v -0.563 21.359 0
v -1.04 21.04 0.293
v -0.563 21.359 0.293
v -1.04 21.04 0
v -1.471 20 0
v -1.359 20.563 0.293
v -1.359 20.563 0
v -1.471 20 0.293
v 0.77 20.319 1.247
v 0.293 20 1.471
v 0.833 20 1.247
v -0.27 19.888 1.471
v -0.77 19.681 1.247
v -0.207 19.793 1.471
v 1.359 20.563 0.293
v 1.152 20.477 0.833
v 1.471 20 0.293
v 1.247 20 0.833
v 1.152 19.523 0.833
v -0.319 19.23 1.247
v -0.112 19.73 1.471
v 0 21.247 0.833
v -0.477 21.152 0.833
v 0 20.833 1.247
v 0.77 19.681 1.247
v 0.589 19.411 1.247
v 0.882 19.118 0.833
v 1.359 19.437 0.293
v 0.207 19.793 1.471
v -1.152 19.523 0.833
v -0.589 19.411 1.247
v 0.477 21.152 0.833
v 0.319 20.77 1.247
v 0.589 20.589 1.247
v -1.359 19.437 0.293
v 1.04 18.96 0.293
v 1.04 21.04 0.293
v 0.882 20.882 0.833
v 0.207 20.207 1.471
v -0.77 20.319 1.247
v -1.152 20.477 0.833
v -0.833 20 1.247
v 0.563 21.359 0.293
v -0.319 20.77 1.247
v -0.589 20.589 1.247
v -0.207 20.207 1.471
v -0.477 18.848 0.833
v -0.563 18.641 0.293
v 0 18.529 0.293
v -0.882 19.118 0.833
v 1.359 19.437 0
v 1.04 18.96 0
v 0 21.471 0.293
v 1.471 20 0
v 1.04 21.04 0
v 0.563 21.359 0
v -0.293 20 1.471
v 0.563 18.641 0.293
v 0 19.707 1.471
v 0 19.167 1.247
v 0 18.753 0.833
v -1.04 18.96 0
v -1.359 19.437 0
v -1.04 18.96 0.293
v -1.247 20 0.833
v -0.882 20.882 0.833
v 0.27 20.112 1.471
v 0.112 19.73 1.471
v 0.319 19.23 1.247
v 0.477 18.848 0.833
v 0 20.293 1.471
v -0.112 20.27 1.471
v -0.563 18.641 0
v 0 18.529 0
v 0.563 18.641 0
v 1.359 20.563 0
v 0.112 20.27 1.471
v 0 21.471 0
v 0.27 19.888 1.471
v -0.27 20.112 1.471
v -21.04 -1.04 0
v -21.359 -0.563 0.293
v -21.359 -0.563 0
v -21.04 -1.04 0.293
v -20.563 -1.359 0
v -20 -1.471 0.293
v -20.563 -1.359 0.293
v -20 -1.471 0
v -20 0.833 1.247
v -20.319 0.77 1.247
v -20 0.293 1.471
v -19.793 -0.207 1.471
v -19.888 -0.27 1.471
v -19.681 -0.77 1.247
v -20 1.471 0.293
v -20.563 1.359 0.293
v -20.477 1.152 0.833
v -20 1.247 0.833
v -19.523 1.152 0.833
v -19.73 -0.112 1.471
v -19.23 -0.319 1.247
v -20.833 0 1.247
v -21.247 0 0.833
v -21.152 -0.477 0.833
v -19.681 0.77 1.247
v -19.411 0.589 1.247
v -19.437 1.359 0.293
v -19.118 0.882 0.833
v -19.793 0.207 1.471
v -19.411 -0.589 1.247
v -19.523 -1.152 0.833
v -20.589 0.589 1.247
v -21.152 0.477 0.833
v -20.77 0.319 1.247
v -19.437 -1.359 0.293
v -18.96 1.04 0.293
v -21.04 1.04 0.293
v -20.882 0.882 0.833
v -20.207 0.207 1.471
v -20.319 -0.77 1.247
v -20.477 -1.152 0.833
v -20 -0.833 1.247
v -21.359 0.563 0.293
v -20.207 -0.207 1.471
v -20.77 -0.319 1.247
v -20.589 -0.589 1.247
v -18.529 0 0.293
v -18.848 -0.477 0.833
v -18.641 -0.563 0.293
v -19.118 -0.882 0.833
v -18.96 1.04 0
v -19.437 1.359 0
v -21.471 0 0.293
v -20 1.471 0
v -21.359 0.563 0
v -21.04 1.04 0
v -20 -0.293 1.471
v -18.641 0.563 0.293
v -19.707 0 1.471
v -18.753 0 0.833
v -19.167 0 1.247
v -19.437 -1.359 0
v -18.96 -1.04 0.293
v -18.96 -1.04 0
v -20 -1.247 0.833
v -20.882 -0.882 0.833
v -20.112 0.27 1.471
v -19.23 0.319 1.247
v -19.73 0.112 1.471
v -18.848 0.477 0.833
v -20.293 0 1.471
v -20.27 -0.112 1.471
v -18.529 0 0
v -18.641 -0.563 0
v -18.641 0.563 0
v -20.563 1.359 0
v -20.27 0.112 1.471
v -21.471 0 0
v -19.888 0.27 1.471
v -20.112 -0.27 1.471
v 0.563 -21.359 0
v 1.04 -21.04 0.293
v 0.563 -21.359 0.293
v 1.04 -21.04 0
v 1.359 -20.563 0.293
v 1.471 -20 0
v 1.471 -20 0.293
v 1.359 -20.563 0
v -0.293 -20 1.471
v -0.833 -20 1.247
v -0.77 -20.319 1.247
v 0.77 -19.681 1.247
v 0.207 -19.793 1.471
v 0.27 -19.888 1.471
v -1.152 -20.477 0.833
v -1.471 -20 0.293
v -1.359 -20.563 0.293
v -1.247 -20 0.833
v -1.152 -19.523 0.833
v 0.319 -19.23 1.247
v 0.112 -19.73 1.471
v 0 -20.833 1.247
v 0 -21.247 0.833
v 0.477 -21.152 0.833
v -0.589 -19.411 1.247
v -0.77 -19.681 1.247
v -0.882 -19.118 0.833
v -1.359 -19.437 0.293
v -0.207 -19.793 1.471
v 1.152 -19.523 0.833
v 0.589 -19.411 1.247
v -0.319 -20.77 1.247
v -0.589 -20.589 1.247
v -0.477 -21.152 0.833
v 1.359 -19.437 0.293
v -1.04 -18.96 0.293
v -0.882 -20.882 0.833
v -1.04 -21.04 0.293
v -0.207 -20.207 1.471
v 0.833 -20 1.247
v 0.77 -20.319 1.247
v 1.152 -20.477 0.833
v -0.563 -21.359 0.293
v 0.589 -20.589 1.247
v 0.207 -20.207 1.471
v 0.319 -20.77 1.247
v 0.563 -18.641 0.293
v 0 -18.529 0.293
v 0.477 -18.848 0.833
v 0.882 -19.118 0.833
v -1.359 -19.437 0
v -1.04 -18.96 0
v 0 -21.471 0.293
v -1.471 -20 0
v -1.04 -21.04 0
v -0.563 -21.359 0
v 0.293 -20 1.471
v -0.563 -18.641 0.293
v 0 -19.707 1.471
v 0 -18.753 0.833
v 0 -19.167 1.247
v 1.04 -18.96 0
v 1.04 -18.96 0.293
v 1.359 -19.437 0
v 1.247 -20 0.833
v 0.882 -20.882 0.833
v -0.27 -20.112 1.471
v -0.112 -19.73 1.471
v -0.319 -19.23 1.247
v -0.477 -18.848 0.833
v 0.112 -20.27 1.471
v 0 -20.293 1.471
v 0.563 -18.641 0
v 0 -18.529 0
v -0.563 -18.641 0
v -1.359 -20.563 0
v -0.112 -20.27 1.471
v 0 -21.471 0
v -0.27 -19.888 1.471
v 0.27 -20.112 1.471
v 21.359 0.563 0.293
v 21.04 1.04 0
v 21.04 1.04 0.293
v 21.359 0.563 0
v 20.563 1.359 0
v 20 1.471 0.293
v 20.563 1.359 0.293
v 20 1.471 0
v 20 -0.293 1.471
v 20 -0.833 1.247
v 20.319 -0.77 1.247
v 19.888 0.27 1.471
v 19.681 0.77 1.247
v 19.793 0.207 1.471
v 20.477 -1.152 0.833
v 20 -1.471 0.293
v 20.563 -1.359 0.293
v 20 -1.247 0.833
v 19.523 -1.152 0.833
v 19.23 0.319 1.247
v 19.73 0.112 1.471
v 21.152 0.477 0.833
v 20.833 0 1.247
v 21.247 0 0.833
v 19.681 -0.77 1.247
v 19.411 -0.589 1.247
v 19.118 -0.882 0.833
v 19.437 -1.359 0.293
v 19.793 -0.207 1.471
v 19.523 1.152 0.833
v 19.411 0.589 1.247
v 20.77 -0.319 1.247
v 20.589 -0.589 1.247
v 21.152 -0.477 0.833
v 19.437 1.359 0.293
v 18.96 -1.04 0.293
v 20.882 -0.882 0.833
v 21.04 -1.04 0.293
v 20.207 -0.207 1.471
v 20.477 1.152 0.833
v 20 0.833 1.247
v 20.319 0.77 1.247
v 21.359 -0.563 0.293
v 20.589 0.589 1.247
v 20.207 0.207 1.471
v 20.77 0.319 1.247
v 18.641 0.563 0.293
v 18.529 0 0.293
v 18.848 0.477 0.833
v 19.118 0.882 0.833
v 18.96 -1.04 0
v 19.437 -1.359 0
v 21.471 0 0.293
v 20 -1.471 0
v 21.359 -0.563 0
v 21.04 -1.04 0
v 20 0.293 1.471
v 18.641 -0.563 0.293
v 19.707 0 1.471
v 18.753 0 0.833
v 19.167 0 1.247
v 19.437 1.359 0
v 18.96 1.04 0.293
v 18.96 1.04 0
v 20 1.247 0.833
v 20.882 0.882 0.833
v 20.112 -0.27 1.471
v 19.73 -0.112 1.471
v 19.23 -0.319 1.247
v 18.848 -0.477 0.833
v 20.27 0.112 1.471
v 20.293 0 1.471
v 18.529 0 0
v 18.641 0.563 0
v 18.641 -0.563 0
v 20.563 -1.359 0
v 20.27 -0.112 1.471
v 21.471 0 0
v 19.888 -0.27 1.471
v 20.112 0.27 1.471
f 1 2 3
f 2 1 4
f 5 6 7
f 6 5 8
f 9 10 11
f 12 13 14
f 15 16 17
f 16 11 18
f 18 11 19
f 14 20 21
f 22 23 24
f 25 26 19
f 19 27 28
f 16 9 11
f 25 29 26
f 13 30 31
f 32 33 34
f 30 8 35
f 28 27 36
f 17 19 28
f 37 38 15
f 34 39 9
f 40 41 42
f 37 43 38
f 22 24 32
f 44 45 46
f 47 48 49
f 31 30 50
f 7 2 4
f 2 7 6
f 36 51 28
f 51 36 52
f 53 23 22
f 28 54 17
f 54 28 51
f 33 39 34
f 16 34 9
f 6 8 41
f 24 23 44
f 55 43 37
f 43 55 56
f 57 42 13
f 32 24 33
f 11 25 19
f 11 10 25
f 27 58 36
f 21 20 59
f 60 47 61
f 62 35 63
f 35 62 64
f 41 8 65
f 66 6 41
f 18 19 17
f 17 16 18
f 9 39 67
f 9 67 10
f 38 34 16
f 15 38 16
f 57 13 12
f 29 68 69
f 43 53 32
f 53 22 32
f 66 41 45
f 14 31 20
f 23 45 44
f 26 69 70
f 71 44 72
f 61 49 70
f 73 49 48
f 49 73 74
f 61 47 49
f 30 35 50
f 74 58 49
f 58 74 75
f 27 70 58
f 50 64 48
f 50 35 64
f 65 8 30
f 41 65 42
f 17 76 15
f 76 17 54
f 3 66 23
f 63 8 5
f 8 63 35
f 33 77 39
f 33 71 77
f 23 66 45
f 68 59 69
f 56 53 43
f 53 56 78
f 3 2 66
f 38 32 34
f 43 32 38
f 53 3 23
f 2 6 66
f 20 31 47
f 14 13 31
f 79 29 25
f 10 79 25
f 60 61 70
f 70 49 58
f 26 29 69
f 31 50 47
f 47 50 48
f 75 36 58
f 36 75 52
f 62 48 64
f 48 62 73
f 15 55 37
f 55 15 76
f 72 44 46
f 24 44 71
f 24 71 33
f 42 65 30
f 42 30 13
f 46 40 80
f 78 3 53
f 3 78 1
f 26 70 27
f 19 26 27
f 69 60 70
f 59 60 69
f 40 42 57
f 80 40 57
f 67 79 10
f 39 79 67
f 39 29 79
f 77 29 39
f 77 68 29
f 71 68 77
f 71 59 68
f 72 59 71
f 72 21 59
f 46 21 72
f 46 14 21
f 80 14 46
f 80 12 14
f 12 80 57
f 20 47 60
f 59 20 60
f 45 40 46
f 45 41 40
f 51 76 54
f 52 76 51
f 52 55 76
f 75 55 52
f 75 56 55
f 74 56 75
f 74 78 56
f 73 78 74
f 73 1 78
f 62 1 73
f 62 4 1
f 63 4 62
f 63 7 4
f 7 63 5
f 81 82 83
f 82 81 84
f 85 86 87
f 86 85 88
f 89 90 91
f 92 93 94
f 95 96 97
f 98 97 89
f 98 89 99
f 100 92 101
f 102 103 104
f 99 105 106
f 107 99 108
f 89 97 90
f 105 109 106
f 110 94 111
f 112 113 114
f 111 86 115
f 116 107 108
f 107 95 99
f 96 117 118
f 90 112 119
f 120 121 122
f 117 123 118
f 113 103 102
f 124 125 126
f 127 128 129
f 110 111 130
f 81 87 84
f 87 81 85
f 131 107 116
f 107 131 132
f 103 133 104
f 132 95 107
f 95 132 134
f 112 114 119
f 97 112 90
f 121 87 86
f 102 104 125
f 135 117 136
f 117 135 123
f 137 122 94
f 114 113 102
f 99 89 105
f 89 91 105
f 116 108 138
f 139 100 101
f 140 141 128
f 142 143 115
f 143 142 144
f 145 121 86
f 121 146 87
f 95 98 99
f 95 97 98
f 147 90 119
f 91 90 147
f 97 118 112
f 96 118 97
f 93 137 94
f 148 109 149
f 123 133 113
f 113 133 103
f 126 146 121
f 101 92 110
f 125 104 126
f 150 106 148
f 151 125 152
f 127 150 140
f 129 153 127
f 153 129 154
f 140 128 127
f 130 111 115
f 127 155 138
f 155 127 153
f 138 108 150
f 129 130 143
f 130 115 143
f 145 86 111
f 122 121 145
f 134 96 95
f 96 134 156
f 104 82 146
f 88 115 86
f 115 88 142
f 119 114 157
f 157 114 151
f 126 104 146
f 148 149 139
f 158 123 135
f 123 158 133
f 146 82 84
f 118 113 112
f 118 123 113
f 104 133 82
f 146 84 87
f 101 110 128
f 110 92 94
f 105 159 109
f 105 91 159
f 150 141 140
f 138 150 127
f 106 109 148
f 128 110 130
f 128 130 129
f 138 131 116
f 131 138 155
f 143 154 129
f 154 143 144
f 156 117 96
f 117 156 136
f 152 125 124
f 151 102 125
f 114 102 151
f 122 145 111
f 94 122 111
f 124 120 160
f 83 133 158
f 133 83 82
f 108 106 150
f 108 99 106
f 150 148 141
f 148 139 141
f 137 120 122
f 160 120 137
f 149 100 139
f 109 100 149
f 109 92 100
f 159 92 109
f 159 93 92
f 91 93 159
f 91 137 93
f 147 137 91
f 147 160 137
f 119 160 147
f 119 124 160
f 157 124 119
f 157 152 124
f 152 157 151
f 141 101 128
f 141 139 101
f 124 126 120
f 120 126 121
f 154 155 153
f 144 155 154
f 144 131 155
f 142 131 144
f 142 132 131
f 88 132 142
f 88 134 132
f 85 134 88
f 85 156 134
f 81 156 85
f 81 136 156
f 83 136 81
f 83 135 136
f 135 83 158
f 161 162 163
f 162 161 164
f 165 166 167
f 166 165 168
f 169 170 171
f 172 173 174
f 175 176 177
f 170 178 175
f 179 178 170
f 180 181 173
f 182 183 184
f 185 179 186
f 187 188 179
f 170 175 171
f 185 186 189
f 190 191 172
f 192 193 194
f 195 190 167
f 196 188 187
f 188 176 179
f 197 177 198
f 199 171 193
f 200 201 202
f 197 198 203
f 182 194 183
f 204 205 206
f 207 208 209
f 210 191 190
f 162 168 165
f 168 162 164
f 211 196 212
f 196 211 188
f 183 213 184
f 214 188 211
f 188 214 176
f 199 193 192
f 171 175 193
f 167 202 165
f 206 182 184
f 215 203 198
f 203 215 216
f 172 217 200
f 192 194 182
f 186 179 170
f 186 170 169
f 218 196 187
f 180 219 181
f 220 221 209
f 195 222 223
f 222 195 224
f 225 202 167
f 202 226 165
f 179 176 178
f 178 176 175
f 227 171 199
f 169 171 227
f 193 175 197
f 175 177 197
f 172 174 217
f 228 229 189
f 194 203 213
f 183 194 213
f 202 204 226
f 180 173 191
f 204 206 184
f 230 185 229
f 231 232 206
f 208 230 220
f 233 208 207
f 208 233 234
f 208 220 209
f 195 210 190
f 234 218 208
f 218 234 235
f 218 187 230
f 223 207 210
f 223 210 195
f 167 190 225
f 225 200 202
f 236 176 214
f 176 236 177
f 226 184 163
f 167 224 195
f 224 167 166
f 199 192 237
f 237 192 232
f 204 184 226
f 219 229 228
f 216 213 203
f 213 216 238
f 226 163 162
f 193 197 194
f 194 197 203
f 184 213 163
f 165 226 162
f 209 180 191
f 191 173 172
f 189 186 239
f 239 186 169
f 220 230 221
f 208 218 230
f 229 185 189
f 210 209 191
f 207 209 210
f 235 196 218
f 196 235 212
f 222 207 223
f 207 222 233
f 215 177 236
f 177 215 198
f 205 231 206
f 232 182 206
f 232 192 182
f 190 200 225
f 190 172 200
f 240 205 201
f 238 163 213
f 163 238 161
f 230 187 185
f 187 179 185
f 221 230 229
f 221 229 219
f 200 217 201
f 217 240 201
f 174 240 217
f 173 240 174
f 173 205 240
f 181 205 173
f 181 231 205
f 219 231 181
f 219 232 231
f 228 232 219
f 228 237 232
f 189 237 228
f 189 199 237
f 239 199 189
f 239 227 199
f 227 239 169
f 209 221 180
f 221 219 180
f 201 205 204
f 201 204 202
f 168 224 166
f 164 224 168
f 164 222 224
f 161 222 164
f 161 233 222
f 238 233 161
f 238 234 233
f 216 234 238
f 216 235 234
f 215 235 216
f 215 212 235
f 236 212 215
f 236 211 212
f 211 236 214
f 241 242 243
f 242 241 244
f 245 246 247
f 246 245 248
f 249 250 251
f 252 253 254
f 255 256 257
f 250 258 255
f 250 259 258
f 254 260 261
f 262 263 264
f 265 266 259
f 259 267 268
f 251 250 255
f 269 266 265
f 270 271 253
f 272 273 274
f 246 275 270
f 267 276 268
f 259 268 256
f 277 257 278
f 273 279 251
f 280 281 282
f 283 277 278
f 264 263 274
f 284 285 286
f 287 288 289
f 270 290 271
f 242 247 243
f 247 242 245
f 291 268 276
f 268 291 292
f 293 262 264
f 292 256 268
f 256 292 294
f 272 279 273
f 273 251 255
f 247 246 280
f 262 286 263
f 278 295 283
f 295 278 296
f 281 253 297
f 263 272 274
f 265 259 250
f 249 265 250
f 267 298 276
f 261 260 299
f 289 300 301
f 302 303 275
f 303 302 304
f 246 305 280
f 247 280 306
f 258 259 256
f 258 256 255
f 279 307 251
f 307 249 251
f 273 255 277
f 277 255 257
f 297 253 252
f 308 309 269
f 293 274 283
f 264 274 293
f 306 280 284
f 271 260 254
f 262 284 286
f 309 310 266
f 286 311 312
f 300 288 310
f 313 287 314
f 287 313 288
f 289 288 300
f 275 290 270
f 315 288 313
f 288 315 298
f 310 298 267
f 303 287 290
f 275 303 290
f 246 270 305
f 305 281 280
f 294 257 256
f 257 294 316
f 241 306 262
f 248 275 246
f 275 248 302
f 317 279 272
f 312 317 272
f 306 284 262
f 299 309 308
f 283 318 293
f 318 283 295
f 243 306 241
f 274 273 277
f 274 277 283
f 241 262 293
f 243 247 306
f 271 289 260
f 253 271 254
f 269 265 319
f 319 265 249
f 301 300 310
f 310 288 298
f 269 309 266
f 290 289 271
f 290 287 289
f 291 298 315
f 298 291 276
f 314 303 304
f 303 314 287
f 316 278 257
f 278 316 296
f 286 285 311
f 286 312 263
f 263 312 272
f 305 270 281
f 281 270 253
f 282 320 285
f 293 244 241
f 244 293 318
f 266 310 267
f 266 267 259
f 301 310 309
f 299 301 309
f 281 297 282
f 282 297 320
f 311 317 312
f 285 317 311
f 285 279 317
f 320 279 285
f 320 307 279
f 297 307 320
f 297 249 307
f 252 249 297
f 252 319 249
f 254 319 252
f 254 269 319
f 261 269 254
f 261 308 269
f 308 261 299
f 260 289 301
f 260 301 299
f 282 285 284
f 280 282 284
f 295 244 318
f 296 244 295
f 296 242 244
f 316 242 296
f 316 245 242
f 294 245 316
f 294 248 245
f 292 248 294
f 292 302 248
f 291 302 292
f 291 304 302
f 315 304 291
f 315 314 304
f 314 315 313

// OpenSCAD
module support() {
    difference() {
        sphere(r=1.5, $fn=16);
        translate([0, 0, -1.5])
            cylinder(d=5, h=1.5);
    }

}


for (i = [0, 90, 180, 270]) {
    rotate([0, 0, i])
        translate([0, 20, 0])
            support();
}
